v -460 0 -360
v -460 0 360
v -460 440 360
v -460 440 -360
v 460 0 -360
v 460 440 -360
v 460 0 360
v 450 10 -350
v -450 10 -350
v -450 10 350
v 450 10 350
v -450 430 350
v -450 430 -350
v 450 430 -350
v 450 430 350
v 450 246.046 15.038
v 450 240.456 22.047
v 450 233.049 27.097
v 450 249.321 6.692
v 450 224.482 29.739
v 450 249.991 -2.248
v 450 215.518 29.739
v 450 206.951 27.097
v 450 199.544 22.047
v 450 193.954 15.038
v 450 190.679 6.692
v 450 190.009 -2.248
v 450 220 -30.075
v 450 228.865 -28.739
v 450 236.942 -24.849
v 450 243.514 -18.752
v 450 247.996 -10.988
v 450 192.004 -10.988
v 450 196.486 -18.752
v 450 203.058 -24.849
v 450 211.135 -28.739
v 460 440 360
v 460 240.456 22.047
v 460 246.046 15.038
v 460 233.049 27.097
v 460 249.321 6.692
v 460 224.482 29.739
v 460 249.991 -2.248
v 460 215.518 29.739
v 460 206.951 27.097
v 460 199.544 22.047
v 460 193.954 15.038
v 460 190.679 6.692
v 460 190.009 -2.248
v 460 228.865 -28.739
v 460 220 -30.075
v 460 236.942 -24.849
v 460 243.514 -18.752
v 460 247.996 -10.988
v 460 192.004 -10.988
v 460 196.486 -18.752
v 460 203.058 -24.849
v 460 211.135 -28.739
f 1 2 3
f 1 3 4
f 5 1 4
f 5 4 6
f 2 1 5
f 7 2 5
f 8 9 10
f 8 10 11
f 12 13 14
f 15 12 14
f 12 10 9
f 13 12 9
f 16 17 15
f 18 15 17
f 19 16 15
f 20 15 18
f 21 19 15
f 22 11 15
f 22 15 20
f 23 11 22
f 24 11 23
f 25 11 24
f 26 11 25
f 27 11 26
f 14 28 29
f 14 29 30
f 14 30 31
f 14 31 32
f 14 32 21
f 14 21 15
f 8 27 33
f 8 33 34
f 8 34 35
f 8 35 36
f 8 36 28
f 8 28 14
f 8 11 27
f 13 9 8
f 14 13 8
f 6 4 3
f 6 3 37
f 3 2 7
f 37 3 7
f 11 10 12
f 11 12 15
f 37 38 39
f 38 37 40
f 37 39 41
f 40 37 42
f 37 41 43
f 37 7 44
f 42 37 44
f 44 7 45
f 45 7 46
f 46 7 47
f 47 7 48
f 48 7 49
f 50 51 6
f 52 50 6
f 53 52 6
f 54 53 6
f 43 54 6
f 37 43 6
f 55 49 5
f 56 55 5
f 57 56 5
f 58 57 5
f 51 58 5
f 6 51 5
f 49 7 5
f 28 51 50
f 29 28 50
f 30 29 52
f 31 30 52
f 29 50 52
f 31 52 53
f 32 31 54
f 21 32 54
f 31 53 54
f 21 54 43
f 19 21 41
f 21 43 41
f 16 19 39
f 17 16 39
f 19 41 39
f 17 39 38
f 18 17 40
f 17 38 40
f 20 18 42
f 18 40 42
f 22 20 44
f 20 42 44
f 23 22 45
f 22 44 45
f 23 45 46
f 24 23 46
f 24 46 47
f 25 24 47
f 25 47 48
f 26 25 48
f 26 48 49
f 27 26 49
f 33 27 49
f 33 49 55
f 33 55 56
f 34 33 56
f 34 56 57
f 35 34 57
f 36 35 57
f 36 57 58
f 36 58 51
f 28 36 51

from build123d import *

# Parameters (mm, degrees)
SKETCH1_W           = 920
SKETCH1_H           = 720
BOSS_EXTRUDE1_DEPTH = 440
SHELL1_T            = 10
CUT_EXTRUDE1_REACH  = 922
SKETCH2_R           = 30.075332342


with BuildPart() as part:
    # Sketch1 → Boss-Extrude1 (new body)
    with BuildSketch(Plane(origin=(0, 0, 0), x_dir=(1, 0, 0), z_dir=(0, 1, 0))):
        Rectangle(SKETCH1_W, SKETCH1_H)
    extrude(amount=BOSS_EXTRUDE1_DEPTH)

    # Shell1 (no face opened: a closed hollow body)
    add(offset(amount=-SHELL1_T, mode=Mode.PRIVATE), mode=Mode.SUBTRACT)

    # Sketch2 → Cut-Extrude1 (cut, up to next)
    with BuildSketch(Plane(origin=(460, 0, 0), x_dir=(0, 0, -1), z_dir=(1, 0, 0)), mode=Mode.PRIVATE) as cut_extrude1_sk1:
        with Locations((0, 220)):
            Circle(SKETCH2_R)
    cut_extrude1_tool1 = extrude(cut_extrude1_sk1.sketch, amount=-CUT_EXTRUDE1_REACH, mode=Mode.PRIVATE) & part.part
    add(cut_extrude1_tool1.solids().sort_by_distance((460, 220, 0))[0], mode=Mode.SUBTRACT)


solid = part.part
